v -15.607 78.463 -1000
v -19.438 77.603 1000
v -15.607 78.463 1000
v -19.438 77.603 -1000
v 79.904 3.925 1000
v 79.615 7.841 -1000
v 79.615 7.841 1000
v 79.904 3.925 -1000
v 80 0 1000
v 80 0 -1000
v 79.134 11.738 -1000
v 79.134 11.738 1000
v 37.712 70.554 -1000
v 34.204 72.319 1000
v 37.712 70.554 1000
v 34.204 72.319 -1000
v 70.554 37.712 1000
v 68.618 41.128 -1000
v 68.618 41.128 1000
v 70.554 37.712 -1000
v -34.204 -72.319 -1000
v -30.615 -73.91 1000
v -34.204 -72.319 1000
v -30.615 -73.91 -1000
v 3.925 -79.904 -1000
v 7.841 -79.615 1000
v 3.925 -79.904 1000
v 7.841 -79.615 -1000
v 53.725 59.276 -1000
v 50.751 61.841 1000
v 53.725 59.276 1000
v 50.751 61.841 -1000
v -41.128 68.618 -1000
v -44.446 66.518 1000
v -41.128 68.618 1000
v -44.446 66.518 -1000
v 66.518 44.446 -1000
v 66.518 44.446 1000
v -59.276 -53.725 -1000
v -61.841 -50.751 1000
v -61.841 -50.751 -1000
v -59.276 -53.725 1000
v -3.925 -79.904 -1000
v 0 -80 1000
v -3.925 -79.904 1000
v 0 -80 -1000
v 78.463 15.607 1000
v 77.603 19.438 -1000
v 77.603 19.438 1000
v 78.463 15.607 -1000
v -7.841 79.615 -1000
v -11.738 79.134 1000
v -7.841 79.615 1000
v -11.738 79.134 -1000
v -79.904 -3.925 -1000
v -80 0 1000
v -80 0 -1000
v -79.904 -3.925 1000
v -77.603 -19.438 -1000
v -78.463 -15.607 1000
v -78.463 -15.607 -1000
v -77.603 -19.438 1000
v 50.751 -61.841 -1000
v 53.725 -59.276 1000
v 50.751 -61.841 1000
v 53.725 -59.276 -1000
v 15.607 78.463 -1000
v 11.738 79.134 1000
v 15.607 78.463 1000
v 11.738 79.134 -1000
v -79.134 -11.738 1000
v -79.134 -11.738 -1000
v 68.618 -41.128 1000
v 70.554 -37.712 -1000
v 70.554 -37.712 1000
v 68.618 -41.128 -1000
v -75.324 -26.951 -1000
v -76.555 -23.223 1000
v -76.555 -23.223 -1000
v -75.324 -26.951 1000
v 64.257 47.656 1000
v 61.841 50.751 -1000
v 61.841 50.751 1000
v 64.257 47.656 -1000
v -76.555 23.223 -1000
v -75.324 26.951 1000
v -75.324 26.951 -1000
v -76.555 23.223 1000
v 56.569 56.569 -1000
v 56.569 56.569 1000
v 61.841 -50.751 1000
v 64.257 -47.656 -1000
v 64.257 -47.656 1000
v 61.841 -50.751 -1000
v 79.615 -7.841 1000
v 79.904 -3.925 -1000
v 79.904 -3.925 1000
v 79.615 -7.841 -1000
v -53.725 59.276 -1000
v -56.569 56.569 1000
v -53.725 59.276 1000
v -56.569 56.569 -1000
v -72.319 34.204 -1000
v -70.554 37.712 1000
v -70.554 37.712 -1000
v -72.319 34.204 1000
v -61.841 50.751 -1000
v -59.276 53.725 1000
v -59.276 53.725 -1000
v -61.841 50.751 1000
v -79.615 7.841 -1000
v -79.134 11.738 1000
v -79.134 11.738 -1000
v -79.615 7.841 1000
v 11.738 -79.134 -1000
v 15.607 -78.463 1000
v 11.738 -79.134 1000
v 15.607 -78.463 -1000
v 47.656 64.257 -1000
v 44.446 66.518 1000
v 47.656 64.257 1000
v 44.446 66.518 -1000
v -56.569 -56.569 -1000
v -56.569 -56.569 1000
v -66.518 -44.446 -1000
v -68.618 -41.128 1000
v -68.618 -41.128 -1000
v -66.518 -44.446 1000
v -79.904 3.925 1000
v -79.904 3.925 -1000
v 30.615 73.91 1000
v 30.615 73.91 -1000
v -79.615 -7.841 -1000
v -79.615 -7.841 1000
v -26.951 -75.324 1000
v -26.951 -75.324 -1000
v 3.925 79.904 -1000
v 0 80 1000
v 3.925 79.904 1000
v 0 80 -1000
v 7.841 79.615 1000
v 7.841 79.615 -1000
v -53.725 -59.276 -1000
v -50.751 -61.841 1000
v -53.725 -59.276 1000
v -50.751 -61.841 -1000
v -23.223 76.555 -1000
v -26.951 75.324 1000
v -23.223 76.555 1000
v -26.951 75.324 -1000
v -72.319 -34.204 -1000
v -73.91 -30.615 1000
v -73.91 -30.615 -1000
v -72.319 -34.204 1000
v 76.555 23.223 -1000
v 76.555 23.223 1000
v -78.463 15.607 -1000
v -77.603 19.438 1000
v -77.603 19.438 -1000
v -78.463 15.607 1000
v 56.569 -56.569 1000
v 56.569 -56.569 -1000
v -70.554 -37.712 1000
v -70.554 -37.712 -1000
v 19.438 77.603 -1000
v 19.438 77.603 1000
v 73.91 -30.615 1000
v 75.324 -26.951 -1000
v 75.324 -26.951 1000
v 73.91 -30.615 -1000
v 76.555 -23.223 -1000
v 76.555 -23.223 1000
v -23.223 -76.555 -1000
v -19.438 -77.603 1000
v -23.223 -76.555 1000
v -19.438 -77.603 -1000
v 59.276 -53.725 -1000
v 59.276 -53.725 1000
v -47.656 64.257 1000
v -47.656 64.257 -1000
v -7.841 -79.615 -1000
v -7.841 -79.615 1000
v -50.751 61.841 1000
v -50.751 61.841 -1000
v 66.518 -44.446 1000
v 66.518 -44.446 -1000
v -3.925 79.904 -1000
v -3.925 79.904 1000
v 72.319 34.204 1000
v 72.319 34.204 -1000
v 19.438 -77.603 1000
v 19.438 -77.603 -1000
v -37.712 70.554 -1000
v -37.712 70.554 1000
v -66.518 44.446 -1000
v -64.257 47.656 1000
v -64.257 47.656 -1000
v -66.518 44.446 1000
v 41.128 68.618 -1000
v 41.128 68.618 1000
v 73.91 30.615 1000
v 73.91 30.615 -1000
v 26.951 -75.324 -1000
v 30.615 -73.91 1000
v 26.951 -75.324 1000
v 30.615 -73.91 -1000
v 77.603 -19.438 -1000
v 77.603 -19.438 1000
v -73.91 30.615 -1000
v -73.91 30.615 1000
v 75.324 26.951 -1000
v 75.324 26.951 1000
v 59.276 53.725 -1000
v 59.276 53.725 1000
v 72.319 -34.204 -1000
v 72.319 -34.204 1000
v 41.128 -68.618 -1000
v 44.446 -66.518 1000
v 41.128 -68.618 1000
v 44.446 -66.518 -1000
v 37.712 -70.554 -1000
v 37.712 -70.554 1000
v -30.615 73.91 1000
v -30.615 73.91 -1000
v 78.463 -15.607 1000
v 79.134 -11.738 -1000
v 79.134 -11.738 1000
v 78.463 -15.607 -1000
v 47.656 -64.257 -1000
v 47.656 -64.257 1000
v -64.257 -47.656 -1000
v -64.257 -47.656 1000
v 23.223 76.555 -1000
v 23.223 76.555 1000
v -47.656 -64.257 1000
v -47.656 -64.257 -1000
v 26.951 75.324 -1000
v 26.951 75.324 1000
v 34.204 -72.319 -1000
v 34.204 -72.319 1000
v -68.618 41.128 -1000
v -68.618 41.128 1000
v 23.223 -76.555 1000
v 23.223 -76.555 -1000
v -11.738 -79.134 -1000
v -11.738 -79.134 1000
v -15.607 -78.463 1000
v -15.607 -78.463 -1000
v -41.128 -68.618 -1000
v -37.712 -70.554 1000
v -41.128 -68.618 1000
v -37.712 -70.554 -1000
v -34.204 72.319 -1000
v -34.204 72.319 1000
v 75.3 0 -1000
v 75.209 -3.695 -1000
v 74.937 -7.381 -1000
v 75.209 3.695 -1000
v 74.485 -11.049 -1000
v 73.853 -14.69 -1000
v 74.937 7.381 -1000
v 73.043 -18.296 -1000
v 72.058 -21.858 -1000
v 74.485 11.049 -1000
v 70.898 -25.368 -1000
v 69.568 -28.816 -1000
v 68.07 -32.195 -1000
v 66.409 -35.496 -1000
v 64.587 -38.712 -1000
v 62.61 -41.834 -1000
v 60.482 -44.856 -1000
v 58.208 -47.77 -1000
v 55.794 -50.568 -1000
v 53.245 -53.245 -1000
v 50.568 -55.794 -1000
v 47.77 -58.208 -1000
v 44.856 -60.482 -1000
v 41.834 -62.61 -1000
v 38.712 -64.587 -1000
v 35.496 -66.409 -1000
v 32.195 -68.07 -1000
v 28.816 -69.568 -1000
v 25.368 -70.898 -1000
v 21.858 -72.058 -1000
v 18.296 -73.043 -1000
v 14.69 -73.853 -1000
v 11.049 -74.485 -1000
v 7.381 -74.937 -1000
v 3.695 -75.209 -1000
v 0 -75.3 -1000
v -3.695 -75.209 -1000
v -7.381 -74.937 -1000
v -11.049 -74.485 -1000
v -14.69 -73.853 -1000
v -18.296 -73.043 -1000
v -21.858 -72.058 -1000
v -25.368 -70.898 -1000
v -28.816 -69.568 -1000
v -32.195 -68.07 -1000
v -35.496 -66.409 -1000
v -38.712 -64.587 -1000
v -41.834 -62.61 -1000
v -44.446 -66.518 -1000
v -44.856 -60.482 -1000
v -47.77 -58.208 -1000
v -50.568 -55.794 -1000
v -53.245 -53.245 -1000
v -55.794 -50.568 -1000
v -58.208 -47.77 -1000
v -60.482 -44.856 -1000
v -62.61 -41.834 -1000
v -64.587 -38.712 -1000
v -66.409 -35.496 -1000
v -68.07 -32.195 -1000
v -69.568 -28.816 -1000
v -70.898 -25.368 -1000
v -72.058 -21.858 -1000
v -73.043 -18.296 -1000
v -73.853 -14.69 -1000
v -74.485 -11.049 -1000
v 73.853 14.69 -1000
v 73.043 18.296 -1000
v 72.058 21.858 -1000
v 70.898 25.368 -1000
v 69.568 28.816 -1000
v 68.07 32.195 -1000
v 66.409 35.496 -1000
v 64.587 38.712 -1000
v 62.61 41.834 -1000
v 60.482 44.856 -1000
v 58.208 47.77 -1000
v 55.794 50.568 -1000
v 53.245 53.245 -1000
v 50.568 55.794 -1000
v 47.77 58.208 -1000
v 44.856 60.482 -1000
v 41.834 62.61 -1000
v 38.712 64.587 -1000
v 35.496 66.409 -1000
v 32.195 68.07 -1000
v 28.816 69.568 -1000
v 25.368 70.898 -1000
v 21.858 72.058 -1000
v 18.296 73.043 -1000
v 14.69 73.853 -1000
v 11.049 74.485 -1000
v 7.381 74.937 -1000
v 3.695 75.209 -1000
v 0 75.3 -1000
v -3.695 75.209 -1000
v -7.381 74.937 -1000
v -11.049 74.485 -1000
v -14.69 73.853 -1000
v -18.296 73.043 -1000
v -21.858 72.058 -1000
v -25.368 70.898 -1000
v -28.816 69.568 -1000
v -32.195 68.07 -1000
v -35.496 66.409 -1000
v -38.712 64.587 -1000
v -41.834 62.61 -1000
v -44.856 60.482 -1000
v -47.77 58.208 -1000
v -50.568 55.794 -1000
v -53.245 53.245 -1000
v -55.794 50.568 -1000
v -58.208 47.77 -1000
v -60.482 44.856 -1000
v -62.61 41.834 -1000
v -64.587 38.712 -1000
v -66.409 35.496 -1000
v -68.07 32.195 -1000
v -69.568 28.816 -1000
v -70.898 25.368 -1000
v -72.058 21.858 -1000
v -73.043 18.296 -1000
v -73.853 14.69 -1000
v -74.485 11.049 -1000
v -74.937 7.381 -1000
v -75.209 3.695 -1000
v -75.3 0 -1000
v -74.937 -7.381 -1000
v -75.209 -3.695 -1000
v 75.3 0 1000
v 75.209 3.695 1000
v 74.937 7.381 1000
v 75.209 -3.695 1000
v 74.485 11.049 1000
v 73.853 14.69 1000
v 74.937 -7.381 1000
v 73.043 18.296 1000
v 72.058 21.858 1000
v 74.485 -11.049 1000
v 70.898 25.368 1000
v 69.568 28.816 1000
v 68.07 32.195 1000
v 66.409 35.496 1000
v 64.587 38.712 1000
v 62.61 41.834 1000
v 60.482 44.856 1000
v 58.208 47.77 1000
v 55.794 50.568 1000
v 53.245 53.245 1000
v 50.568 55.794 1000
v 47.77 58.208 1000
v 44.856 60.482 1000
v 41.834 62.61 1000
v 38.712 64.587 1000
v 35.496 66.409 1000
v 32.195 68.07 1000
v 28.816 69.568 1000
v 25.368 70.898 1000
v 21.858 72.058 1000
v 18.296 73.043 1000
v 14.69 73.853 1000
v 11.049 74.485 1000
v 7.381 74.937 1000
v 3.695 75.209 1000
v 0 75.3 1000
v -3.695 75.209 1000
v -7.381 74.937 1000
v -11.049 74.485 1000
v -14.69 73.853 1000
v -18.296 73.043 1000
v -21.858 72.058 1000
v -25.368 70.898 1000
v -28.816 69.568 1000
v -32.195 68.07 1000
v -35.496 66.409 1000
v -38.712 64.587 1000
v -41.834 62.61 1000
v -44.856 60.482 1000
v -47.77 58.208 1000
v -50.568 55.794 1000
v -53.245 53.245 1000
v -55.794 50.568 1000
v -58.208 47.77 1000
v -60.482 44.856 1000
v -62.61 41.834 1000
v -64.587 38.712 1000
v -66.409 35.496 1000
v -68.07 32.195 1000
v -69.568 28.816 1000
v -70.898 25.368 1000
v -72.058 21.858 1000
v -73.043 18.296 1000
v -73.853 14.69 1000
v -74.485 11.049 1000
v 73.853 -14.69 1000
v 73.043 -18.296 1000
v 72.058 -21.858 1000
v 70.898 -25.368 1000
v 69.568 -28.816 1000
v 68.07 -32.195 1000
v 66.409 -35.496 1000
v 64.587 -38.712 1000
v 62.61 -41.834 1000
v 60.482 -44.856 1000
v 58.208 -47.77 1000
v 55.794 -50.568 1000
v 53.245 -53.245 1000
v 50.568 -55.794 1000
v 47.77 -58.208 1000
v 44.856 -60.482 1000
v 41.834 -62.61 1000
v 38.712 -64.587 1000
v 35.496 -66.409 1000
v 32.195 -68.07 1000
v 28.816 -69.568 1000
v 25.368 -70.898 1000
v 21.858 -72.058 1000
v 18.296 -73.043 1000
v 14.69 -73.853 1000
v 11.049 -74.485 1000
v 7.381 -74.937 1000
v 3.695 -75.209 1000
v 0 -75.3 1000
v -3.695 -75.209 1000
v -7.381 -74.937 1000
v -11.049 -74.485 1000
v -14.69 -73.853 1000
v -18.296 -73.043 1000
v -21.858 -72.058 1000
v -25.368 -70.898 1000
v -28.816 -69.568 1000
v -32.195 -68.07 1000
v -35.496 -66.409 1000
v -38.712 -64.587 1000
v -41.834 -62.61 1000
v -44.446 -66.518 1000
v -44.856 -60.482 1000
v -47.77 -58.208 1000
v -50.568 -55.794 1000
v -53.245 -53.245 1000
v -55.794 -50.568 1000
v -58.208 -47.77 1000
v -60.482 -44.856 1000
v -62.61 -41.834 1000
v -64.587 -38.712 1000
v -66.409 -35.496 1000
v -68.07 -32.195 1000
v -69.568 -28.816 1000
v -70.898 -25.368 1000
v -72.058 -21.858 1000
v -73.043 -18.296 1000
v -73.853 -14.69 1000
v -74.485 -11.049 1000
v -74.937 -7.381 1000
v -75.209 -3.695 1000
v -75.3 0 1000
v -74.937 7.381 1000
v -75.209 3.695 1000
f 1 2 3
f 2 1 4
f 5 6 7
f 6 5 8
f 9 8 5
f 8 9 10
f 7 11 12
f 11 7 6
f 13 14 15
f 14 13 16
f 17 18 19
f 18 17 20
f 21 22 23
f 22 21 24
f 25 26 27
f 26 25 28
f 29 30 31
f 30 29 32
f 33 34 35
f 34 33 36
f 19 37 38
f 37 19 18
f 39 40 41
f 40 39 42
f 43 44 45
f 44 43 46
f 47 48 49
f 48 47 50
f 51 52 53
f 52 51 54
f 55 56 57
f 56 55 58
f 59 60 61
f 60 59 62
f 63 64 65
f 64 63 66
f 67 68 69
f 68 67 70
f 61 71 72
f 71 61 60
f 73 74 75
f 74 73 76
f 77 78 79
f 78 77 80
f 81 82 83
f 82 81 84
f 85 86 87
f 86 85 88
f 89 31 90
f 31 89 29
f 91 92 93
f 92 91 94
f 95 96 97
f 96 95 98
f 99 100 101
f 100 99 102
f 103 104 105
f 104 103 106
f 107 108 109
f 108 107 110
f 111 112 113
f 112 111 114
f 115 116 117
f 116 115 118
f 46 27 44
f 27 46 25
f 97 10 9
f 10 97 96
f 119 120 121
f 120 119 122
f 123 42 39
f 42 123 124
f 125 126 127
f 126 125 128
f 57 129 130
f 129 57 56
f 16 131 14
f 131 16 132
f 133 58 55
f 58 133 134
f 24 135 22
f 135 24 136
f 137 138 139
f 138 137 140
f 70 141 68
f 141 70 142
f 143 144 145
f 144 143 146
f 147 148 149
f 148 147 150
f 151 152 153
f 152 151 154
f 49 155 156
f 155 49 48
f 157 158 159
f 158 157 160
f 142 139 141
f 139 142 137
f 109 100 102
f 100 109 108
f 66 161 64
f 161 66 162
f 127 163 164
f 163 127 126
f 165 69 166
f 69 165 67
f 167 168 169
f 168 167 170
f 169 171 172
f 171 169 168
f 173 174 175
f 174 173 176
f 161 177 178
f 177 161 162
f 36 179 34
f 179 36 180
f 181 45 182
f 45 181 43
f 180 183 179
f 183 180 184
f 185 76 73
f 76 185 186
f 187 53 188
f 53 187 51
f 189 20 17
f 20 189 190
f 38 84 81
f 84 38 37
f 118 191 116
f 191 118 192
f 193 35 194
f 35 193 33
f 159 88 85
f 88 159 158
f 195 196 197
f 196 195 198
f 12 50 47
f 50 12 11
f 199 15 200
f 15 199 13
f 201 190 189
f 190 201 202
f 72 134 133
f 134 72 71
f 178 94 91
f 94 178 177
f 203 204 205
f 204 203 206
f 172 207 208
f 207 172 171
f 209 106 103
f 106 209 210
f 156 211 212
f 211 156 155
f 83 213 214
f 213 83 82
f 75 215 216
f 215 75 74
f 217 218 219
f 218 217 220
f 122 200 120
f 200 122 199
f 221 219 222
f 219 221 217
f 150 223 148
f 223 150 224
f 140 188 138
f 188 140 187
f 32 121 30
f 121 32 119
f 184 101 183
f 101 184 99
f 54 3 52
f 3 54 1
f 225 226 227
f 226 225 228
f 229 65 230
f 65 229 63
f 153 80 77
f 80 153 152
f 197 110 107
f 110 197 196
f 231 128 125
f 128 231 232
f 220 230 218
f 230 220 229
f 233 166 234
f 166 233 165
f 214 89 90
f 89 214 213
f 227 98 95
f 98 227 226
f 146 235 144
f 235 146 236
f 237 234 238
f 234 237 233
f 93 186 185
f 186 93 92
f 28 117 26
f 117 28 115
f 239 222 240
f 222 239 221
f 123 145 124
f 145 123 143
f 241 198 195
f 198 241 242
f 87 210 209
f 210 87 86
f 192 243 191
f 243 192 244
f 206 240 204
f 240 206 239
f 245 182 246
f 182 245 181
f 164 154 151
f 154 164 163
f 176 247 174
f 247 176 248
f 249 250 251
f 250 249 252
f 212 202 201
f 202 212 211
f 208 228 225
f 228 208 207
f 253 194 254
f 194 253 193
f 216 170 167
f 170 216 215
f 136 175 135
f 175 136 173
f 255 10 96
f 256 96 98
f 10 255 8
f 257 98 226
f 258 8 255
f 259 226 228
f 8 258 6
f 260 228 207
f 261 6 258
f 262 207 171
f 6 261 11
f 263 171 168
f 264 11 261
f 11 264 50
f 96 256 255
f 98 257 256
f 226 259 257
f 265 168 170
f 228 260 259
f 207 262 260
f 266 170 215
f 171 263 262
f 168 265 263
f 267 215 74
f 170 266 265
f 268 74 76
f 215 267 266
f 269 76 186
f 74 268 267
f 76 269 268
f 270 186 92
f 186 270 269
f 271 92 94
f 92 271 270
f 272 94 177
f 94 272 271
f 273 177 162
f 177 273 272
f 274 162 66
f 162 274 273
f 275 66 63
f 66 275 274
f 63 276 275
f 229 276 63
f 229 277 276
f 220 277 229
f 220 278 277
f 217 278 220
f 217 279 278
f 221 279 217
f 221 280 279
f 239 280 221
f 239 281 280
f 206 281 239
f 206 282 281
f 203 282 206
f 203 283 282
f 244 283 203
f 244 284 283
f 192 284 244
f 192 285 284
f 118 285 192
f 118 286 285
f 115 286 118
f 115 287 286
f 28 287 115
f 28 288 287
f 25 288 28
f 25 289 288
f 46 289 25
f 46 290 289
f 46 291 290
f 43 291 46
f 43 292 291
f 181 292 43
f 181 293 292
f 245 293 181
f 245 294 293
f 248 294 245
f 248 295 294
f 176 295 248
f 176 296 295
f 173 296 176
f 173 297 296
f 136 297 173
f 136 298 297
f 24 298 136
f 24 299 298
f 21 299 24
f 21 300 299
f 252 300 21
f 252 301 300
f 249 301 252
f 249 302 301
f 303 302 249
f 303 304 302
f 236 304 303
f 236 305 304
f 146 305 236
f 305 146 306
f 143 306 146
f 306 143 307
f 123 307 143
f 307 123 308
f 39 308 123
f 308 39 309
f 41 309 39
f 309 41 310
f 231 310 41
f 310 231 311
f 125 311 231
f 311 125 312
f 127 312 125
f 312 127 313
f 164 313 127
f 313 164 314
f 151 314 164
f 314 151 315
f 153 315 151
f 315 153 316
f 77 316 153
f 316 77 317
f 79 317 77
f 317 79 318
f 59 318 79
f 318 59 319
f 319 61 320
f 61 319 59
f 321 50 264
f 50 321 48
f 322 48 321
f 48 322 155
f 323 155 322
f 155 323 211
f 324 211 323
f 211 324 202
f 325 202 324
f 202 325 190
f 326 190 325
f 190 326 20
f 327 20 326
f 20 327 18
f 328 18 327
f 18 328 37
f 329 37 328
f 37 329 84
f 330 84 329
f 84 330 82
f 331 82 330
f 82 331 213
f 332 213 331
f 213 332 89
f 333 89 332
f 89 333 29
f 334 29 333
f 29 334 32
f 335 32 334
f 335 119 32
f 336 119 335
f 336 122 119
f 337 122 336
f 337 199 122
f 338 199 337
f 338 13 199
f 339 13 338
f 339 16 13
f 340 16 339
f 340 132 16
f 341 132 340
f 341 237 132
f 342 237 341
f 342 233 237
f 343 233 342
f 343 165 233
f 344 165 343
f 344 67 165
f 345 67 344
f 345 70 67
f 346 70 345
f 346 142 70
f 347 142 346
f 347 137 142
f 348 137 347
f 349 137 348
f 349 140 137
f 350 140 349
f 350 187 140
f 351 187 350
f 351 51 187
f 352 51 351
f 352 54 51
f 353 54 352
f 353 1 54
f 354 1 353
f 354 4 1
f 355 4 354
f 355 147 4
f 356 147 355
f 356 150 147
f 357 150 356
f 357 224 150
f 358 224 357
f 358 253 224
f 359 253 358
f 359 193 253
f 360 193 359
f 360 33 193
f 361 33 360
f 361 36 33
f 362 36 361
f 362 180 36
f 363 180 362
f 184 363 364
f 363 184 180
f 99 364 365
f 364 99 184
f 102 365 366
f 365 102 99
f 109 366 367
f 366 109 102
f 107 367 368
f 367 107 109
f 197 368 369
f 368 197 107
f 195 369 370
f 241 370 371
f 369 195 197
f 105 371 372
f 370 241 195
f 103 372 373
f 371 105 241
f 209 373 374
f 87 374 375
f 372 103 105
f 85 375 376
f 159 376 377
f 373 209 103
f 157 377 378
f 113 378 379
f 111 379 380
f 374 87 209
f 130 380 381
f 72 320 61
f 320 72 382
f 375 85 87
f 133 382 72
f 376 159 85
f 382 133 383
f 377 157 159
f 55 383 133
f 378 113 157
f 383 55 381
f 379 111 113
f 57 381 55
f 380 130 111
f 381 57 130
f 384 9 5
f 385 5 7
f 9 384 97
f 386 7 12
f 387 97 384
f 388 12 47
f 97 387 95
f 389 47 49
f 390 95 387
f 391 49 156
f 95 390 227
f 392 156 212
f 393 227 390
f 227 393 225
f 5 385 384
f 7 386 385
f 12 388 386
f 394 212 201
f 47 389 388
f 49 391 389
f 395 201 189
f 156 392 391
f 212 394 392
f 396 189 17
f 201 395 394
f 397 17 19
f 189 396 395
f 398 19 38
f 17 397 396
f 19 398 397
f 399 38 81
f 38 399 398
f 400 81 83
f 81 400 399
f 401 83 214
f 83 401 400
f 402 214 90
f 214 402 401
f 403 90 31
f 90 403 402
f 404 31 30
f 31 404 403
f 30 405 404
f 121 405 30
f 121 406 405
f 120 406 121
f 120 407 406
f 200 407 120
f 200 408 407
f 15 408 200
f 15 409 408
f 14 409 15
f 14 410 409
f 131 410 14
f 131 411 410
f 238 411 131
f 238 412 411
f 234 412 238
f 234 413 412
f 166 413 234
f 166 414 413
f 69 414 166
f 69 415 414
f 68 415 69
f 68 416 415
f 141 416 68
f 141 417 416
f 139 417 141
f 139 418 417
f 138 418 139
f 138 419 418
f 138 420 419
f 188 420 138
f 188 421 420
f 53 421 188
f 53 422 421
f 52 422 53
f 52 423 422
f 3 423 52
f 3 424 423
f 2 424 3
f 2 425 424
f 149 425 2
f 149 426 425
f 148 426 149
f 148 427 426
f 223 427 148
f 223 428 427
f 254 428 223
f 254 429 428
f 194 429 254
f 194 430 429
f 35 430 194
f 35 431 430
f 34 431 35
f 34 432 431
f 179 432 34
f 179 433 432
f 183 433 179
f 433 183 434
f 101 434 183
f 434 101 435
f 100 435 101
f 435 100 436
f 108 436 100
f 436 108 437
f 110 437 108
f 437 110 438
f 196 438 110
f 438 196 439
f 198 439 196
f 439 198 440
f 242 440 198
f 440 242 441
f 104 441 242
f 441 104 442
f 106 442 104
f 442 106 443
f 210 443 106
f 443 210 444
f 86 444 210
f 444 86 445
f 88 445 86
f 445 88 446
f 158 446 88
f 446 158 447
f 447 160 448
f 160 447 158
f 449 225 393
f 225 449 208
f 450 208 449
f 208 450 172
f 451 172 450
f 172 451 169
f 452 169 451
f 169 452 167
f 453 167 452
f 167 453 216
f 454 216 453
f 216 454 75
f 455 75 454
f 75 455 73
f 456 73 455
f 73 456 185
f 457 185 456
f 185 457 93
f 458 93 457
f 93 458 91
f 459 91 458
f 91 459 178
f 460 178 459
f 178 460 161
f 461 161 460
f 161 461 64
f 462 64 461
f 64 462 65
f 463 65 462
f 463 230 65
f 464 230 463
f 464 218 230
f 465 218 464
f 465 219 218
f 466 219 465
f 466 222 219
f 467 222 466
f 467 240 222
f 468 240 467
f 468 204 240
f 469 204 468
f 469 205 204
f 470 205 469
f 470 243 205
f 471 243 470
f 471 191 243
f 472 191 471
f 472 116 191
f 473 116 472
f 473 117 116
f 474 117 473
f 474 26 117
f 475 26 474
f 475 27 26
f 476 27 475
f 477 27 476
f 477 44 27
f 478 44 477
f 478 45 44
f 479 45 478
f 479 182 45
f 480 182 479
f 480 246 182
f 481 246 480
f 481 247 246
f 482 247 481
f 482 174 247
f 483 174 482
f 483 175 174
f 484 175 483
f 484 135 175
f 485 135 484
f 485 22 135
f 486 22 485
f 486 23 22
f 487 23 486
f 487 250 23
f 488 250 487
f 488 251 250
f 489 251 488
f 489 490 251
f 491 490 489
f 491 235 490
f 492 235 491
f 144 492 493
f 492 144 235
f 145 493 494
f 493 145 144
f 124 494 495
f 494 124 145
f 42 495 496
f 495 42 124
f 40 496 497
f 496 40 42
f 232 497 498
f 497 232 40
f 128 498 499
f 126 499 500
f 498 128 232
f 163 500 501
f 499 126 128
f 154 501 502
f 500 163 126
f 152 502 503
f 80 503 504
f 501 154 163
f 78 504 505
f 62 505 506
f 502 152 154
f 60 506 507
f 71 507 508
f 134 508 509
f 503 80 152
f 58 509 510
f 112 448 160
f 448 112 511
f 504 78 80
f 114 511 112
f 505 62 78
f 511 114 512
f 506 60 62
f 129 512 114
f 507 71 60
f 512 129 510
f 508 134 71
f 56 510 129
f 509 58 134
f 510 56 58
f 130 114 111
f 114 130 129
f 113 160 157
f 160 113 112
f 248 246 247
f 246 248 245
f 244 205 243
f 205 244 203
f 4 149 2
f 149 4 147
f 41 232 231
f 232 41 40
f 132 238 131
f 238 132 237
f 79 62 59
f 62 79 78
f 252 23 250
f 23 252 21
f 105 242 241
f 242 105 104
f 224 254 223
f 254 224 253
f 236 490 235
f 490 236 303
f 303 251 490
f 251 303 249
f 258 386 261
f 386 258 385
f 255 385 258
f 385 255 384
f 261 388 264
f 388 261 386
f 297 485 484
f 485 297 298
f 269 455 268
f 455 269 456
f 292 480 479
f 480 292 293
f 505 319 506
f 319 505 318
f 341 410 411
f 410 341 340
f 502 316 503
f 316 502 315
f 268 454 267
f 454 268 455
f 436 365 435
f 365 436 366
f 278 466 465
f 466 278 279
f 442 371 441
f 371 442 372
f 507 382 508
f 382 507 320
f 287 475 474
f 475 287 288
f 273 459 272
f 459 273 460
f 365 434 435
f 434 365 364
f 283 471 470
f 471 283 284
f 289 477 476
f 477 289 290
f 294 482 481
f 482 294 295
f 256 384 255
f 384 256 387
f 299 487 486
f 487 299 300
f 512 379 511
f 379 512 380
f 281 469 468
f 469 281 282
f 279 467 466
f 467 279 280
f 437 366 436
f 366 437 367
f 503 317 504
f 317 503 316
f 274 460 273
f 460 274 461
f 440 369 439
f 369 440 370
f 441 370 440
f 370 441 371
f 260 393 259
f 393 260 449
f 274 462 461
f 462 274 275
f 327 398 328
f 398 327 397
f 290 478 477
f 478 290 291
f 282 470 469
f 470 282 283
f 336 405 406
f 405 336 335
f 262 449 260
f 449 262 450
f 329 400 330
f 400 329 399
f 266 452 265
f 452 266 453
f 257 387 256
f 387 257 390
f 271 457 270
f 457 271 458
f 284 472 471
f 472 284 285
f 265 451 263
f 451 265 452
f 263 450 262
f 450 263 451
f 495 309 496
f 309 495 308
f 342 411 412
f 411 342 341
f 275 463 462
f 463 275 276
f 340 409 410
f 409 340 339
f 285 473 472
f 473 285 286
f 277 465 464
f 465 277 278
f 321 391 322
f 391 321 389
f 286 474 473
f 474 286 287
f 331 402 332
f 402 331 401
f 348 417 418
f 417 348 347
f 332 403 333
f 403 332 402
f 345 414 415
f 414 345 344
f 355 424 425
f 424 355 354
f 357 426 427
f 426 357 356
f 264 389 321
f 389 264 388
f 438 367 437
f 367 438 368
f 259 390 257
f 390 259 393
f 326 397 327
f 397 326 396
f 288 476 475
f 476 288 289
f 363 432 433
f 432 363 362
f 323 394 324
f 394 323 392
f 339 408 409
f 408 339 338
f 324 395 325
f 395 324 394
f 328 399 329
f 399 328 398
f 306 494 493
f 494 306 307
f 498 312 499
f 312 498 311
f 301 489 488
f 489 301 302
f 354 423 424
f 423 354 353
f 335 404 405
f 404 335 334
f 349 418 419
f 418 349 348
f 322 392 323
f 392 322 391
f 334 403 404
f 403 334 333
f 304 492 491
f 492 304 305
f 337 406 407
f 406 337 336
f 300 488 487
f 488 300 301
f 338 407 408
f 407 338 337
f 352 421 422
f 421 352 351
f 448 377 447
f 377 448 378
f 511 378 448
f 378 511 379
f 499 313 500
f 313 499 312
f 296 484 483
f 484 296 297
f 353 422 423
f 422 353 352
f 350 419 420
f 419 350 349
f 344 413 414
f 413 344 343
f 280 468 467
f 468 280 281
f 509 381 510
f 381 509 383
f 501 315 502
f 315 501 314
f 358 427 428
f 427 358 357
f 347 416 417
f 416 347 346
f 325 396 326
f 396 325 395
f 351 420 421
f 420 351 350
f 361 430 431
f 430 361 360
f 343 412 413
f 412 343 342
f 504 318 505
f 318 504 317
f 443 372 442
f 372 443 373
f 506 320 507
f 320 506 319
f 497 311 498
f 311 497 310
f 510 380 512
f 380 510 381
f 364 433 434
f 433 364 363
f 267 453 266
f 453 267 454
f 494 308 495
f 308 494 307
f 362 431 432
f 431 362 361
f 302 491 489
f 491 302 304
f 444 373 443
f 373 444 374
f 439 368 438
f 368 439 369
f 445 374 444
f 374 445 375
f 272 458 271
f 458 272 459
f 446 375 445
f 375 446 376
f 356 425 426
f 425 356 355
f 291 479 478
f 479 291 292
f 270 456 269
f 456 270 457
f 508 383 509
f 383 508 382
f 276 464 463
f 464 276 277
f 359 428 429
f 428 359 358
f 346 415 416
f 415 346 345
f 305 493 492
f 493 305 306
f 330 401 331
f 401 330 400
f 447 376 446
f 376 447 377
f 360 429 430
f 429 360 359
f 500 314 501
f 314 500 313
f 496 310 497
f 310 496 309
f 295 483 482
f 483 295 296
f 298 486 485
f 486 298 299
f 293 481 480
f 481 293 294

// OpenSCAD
$fn=128;

module ht_pipe(od=160, length=2000, wall=4.7) {
    difference() {
        cylinder(h=length, d=od, center=true);
        cylinder(h=length+2, d=od-2*wall, center=true);
    }
}

ht_pipe(od=160, length=2000, wall=4.7);
